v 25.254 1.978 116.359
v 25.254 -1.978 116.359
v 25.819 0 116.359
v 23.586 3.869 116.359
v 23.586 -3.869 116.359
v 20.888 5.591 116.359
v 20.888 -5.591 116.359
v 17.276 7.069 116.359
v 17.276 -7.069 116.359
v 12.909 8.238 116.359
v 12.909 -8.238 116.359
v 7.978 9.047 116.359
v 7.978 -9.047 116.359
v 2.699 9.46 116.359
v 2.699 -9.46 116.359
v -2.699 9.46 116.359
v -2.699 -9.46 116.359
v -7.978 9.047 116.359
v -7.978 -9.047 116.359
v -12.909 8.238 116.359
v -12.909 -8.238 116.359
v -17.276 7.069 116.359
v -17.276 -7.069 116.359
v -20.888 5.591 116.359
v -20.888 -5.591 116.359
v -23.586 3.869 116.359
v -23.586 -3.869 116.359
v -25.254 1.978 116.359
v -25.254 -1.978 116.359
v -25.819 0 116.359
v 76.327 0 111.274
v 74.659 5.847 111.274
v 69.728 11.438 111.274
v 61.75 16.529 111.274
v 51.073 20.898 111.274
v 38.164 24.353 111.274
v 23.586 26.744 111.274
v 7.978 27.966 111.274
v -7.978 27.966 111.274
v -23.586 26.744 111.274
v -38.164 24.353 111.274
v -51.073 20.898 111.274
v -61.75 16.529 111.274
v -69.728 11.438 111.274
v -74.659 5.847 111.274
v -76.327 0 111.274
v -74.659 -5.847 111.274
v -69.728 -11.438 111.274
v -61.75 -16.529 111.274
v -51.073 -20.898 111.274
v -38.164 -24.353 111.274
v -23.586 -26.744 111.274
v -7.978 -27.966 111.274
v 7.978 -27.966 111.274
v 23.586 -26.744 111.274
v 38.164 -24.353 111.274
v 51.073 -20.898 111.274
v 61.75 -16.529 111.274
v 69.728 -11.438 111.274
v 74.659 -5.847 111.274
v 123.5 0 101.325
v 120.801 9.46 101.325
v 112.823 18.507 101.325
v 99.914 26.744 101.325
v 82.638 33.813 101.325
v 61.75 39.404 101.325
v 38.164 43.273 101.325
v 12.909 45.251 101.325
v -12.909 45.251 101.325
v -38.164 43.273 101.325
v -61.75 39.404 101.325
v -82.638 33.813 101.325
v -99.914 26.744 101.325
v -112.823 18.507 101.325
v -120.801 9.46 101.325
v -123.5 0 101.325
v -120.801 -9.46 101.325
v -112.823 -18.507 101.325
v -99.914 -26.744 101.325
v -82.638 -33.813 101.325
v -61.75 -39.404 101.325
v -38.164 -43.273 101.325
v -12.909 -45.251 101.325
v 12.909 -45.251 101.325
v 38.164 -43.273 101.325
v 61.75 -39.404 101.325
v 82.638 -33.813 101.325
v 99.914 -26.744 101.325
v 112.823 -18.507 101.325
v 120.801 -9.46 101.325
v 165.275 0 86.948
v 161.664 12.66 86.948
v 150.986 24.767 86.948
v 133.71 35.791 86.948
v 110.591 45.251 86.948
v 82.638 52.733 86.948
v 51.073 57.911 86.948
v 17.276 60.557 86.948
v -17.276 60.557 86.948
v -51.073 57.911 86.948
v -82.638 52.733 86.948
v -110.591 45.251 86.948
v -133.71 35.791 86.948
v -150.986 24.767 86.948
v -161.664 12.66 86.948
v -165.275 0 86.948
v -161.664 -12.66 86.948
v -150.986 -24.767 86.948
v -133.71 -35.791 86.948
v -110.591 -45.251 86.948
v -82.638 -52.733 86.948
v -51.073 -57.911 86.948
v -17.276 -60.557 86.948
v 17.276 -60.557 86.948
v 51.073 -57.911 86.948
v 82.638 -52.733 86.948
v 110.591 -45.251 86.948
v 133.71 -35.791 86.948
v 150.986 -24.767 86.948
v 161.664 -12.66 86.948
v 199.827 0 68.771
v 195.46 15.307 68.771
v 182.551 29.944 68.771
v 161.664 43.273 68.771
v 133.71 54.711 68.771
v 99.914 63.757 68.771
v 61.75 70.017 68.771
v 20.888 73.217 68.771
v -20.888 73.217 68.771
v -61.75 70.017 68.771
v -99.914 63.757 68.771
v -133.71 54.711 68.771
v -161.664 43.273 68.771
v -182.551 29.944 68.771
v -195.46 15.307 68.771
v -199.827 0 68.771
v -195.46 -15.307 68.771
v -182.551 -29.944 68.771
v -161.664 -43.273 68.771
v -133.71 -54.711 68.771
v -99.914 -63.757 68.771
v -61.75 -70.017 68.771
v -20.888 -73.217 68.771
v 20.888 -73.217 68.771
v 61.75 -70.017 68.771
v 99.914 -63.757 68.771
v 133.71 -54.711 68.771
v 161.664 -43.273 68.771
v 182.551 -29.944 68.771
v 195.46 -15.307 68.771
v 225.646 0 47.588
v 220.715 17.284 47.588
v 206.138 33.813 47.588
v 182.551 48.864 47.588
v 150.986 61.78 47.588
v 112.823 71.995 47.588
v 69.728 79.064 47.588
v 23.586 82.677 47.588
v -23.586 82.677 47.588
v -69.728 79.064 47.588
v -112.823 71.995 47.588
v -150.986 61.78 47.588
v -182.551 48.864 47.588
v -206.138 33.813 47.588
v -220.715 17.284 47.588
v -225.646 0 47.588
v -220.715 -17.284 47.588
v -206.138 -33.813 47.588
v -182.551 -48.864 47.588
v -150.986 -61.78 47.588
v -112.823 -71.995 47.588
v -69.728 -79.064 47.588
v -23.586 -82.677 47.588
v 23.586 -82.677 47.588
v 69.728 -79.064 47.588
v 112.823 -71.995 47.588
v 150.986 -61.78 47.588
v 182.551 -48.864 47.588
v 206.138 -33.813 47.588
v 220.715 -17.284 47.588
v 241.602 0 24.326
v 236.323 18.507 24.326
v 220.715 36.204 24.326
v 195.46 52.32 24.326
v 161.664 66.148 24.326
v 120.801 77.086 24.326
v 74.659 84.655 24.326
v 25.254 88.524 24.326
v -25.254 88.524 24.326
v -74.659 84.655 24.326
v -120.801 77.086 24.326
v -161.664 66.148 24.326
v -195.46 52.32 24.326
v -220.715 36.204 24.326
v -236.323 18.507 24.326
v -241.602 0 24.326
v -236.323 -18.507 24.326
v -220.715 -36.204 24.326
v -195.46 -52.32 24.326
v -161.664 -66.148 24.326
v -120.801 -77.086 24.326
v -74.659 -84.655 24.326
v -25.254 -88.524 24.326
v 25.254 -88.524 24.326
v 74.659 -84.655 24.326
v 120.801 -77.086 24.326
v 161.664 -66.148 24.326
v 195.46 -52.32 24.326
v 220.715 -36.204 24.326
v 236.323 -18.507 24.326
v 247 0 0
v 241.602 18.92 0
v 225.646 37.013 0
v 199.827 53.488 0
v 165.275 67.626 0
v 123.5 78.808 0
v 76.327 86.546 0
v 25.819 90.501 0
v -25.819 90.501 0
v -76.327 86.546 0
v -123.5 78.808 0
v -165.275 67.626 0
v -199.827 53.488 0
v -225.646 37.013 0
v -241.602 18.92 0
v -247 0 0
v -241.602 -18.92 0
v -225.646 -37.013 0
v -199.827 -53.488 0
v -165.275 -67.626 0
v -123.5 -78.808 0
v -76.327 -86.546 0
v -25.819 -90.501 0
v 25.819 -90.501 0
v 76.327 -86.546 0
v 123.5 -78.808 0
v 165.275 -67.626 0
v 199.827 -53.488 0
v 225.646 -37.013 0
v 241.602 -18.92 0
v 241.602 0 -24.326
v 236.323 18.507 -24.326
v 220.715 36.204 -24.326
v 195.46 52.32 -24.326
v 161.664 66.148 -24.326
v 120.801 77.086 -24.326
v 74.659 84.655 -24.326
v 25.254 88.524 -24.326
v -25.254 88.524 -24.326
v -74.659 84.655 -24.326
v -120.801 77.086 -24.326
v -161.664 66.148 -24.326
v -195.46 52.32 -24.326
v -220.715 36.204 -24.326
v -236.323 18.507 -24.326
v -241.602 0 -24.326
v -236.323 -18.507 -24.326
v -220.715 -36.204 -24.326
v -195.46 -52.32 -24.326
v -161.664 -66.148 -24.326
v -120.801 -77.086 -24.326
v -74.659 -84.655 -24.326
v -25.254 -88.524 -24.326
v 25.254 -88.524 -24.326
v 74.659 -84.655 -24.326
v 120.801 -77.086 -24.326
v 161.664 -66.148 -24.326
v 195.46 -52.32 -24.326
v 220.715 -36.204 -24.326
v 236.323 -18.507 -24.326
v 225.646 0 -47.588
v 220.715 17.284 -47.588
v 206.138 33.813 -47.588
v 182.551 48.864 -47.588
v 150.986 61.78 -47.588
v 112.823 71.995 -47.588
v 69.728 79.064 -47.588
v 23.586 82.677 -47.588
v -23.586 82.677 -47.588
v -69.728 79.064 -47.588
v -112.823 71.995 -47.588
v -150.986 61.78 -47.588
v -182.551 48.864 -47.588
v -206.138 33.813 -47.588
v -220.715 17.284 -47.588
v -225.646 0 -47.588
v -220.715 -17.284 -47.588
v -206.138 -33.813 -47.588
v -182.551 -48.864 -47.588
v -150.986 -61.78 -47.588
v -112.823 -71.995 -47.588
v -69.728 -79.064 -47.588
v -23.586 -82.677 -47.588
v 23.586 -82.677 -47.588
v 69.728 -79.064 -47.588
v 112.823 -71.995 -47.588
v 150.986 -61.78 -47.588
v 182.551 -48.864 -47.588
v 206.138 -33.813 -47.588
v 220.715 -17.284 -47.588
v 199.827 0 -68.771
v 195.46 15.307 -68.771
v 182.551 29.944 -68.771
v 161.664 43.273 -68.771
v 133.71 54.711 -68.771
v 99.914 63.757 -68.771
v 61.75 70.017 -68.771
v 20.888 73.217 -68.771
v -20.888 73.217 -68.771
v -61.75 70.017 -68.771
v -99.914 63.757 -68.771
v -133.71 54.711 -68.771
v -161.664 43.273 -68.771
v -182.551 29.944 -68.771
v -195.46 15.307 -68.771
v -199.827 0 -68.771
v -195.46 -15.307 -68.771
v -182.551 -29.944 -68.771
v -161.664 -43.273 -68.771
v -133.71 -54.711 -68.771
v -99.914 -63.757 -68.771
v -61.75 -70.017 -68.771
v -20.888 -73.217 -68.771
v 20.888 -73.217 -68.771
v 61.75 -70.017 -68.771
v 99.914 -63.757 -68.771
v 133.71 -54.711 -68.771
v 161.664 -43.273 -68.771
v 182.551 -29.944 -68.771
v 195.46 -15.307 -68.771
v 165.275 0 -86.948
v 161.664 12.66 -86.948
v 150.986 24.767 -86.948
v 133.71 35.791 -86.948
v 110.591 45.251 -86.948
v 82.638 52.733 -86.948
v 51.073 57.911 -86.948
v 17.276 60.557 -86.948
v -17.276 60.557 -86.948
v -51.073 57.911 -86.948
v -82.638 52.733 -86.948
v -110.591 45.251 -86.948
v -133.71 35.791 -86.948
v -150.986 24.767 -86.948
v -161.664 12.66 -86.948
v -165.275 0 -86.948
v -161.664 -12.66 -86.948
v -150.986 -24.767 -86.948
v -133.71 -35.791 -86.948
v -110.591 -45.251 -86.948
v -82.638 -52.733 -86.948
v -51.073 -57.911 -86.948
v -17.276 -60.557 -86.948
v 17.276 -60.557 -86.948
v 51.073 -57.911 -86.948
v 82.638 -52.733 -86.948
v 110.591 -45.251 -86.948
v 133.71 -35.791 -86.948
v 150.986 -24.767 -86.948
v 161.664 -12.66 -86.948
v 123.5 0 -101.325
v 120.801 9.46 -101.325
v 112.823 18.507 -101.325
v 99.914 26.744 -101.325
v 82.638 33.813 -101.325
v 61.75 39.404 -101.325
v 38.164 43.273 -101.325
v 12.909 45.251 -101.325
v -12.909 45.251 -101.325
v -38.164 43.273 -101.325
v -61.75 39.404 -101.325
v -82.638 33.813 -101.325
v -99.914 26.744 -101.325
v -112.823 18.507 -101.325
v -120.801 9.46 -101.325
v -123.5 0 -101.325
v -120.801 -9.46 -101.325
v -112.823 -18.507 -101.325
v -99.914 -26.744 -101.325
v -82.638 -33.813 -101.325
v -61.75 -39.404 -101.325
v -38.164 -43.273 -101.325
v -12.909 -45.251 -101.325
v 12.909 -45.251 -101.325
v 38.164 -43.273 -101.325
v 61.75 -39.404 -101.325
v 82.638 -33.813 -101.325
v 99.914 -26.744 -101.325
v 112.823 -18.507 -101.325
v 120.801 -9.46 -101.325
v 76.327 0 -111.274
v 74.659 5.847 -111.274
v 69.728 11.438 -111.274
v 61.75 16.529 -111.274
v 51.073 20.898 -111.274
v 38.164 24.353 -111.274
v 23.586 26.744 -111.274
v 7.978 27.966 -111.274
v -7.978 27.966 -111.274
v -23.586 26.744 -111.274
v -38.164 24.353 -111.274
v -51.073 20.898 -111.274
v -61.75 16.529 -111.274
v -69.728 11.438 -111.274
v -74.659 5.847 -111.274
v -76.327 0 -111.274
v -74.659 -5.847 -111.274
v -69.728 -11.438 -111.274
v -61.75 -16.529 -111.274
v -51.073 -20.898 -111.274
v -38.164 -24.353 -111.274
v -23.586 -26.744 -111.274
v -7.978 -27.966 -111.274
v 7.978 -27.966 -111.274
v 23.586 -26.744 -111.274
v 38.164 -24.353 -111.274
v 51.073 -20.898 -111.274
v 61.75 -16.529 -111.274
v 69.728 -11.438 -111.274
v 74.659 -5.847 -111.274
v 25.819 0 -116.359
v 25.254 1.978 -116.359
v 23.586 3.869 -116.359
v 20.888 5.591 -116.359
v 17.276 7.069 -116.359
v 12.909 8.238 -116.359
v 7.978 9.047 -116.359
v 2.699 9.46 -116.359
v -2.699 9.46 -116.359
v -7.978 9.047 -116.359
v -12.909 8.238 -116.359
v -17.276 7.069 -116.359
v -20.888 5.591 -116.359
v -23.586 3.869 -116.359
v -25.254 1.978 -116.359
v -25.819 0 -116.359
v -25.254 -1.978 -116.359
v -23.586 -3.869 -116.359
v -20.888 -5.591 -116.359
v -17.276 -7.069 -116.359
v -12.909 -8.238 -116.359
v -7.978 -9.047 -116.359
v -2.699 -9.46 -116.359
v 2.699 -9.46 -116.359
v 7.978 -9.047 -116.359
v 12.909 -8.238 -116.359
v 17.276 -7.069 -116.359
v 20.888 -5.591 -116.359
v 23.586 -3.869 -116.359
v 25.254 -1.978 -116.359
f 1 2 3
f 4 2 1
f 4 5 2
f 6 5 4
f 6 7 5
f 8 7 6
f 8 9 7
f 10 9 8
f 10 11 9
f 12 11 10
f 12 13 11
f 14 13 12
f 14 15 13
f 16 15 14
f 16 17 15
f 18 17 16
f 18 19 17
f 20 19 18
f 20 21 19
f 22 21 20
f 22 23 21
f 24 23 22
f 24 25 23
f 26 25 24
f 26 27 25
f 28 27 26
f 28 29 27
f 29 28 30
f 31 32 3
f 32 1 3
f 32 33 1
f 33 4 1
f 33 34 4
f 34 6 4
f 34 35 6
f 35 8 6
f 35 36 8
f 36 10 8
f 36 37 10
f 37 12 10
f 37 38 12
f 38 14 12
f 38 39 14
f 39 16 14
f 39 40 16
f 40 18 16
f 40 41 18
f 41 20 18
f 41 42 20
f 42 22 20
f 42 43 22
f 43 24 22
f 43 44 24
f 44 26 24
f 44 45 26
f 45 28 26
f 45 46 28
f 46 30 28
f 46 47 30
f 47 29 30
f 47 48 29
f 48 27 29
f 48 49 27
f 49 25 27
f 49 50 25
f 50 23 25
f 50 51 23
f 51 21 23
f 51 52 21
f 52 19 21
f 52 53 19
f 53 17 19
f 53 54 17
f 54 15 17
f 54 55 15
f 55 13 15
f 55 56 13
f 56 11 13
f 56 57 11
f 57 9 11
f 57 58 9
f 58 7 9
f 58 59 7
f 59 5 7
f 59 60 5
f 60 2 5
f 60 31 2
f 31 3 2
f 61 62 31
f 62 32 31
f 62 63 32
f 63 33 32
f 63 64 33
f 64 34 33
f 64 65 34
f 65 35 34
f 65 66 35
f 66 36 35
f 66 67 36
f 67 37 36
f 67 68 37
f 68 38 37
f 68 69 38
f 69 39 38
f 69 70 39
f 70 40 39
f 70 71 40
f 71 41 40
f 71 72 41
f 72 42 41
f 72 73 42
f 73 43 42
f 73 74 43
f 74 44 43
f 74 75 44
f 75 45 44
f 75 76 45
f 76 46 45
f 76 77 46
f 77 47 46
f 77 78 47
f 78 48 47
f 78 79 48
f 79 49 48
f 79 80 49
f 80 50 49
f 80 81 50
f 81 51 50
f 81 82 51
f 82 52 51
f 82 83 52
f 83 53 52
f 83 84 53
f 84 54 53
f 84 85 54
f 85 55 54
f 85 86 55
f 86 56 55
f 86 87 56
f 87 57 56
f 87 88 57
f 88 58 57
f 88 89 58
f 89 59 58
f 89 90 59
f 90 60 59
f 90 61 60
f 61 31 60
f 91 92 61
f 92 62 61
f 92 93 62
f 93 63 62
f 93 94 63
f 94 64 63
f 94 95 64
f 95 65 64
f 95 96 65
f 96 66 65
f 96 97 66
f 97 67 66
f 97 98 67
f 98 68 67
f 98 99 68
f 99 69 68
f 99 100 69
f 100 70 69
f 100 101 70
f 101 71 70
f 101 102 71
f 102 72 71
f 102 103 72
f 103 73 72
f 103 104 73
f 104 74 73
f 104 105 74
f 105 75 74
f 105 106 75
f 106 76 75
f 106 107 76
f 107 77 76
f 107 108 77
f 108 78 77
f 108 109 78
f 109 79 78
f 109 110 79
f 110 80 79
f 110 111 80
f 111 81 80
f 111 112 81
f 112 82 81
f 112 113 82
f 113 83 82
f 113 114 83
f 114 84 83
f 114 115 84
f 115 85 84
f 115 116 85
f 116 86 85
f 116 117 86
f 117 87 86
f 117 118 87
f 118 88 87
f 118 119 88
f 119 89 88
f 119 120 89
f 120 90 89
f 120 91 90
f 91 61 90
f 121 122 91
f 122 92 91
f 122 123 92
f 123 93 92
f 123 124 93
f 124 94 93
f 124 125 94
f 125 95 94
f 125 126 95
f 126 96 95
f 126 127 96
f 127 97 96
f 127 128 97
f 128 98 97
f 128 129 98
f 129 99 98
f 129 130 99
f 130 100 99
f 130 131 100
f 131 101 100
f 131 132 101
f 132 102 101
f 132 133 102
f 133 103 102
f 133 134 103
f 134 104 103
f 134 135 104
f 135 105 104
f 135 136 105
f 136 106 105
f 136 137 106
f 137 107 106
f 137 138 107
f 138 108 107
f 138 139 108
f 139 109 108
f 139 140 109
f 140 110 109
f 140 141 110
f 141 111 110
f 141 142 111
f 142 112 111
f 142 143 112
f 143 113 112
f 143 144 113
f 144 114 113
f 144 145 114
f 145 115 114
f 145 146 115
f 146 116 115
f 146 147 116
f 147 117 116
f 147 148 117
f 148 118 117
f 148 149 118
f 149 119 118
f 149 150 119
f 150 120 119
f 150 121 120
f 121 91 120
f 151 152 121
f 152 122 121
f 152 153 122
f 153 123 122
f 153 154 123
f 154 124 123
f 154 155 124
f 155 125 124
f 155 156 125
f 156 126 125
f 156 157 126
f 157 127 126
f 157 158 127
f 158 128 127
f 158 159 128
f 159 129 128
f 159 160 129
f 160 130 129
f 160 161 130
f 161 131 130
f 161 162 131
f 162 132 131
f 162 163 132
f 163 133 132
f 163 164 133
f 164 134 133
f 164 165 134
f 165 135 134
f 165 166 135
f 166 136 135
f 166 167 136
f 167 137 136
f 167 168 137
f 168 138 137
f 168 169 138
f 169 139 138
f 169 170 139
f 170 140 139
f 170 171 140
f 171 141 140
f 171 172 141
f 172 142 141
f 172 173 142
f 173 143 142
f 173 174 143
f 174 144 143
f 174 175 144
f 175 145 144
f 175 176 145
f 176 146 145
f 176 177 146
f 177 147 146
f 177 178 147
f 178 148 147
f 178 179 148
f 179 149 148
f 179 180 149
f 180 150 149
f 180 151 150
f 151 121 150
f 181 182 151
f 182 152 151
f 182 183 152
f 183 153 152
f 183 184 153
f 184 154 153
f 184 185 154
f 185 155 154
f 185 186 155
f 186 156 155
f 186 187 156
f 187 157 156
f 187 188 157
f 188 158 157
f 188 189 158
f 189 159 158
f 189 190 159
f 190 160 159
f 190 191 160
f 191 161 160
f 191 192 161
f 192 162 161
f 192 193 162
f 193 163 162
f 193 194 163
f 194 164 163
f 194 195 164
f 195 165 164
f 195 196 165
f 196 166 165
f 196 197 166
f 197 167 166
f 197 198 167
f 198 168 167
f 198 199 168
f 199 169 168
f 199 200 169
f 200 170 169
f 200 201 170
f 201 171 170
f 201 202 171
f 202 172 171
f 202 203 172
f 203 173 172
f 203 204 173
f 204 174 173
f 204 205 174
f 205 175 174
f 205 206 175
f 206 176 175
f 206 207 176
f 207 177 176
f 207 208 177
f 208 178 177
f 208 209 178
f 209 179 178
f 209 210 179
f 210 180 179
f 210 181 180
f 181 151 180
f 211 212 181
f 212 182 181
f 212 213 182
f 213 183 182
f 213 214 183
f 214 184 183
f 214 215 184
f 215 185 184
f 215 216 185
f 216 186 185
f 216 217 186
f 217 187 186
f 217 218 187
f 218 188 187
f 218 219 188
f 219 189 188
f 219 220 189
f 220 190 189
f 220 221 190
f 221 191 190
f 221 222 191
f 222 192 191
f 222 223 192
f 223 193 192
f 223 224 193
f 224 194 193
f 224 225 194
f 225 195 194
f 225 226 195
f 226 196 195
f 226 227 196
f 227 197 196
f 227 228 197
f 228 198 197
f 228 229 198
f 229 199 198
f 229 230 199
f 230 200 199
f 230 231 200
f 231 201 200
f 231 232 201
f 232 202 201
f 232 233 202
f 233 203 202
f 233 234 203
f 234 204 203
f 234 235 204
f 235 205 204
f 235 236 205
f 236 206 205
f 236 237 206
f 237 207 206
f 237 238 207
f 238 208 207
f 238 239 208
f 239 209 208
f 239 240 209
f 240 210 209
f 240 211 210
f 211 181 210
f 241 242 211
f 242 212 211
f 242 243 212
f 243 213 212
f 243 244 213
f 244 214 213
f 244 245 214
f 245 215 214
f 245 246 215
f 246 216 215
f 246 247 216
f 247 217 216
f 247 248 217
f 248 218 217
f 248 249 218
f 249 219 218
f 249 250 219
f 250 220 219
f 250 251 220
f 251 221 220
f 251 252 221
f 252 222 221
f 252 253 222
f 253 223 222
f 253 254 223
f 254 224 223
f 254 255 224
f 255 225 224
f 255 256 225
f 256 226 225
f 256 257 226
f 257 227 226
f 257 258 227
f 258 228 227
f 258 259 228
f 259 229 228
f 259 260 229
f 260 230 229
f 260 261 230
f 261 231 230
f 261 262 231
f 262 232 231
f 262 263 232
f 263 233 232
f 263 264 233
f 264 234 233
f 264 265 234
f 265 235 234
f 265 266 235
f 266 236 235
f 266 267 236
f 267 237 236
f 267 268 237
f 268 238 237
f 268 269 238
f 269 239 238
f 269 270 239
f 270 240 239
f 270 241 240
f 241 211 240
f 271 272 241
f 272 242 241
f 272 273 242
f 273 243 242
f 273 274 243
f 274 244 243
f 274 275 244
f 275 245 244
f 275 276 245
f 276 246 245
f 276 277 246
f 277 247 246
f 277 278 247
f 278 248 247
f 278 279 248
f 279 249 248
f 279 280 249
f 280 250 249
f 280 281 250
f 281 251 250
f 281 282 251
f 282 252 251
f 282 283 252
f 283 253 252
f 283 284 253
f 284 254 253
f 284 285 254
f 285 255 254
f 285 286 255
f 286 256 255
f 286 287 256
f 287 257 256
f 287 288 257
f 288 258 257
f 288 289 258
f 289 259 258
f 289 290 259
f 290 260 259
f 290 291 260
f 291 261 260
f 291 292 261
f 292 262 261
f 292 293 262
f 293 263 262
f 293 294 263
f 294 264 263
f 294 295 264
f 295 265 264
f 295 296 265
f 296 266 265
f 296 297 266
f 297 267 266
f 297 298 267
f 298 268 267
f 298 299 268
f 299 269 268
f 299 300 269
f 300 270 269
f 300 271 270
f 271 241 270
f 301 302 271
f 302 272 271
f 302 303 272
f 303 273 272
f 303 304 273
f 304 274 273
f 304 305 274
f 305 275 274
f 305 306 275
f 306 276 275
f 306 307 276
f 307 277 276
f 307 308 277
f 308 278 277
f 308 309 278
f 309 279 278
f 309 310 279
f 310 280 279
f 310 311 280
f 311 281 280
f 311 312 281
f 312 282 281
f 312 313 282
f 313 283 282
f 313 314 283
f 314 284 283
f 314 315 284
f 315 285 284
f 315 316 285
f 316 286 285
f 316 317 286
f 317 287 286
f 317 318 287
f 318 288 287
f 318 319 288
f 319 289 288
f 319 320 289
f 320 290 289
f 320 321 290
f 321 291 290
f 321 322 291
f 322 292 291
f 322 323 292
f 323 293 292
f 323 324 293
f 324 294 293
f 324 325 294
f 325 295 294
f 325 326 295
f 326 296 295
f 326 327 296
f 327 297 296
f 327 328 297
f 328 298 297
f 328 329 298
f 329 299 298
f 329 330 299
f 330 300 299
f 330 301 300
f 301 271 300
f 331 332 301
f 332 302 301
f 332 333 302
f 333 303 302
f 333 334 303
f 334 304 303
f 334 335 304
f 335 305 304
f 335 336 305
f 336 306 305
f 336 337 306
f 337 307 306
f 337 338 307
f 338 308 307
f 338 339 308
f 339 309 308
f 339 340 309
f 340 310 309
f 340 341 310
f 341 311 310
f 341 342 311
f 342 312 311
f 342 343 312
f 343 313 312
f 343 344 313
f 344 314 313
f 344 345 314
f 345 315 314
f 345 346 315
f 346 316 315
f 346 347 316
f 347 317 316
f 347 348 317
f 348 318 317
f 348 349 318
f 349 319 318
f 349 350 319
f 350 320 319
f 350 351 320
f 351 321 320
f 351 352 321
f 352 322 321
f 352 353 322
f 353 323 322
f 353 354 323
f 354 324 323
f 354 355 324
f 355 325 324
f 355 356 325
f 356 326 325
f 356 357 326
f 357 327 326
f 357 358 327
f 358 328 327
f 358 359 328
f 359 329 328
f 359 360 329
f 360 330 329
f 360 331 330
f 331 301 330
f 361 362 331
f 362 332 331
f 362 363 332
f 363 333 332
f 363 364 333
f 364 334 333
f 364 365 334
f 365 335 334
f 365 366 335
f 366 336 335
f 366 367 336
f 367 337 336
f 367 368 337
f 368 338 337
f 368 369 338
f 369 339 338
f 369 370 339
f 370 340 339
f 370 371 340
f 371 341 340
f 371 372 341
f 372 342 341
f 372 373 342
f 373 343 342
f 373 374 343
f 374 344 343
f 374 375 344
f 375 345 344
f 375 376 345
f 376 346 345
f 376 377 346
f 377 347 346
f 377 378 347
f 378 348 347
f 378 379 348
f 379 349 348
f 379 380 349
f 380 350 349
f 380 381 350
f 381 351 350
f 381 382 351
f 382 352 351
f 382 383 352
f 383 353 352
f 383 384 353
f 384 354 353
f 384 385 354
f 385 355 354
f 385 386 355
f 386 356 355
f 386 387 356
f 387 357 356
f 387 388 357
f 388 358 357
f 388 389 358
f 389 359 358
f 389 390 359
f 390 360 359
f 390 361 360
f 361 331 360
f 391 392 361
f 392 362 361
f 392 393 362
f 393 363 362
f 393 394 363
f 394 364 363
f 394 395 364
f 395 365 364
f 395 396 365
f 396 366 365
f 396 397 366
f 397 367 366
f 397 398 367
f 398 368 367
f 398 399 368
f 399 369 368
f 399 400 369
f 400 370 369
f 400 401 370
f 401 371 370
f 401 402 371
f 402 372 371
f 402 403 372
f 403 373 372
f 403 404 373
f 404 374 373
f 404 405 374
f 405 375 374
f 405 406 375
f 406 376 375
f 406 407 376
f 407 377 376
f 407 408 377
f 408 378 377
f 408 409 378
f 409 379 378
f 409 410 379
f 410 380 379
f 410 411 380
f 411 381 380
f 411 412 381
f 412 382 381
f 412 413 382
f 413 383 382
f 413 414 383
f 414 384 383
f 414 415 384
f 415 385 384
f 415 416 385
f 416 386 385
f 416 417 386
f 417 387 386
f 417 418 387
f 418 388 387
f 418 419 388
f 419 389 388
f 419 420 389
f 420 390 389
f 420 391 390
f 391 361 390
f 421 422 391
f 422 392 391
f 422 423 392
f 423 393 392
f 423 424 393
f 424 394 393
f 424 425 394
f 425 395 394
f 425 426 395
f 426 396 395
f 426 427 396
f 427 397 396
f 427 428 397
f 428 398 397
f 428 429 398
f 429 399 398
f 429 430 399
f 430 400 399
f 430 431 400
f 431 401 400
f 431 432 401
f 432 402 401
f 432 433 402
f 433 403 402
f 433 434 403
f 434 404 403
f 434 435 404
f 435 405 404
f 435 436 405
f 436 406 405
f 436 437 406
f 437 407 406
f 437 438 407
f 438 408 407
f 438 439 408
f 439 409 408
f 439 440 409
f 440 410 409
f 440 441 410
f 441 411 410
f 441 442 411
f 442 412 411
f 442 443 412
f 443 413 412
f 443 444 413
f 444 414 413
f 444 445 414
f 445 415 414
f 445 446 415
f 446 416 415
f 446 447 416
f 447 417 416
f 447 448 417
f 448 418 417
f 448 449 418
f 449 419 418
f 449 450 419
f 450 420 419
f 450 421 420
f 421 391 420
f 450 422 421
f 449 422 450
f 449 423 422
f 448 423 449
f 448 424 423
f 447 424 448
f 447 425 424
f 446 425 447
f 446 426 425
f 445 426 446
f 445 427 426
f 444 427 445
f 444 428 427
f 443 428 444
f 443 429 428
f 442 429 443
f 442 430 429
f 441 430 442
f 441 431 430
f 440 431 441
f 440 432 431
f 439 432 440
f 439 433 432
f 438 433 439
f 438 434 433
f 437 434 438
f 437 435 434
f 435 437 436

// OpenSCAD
// Generated by SolidPython 1.0.1 on 2020-07-29 00:46:53


scale(v = [19, 7, 9]) {
	sphere(r = 13);
}
/***********************************************
*********      SolidPython code:      **********
************************************************
 
# import packages: SolidPython
from solid import *
from solid.utils import *
from itertools import chain, combinations, permutations


class Resize:

    def __init__(self, scad_file):
        self.scad_file = scad_file
        #self.scad_file = import_scad(scad_file)
        # cone/cylinder param:
        self.r1 = 0
        self.r2 = 0
        self.h = 0
        # rectangular prism param:
        self.w = 0
        self.l = 0
        # ellipse param:
        self.r = 0

    # import OpenScad code (file name corresponds to shape)


    # classify shape + parameters
    def assign(self, param1, param2, param3):
        if self.scad_file == 'cone.scad':
            self.r1 = param1
            self.r2 = param2
            self.h = param3
        elif self.scad_file == 'cylinder.scad':
            self.r1 = param1
            self.r2 = param2
            self.h = param3
        elif self.scad_file == 'rectangularPrism.scad':
            self.h = param1
            self.l = param2
            self.w = param3
        else:
            self.r = param1
            self.h = param2

    # resize parameters
    def iterate(self):
        x = range(3, 20, 2)
        i = 1
        if self.scad_file == 'cone.scad':
            tempList = list(permutations(x, 2))
            for temp in tempList:
                param1 = temp[0]
                param2 = temp[1]
                filepath = 'produced_scad_files/' + 'cone' + str(param1) + '_' + str(param2) + '_' + '.scad'
                scad_render_to_file(cylinder(h=param1, r1=param2, r2=0), filepath)

        elif self.scad_file == 'cylinder.scad':
            tempList = list(permutations(x, 3))
            for temp in tempList:
                param1 = temp[0]
                param2 = temp[1]
                filepath = 'produced_scad_files/' + 'cylinder' + str(param1) + '_' + str(param2) + '_' + '.scad'
                scad_render_to_file(cylinder(h=param1, r1=param2, r2=param2), filepath)

        elif self.scad_file == 'rectangularPrism.scad':
            tempList = list(permutations(x, 3))
            for temp in tempList:
                param1 = temp[0]
                param2 = temp[1]
                param3 = temp[2]
                filepath = 'produced_scad_files/' + 'rectangularPrism' + str(param1) + '_' + str(param2) + '_' + str(
                    param3) + '.scad'
                scad_render_to_file(cube(size=(param1, param2, param3)), filepath)

        elif self.scad_file == 'ellipse.scad':
            tempList = list(permutations(x, 4))
            for temp in tempList:
                param1 = temp[0]
                param2 = temp[1]
                param3 = temp[2]
                param4 = temp[3]
                filepath = 'produced_scad_files/' + 'ellipse' + str(param1) + '_' + str(param2) + '_' + str(param3) + '_' + str(param4) + '.scad'
                scad_render_to_file(scale([param1, param2, param3])(sphere(r=param4)), filepath)

    def render_to_scadfile(self):
        scad_render_to_file(scad, 'example.scad') 
 
************************************************/
